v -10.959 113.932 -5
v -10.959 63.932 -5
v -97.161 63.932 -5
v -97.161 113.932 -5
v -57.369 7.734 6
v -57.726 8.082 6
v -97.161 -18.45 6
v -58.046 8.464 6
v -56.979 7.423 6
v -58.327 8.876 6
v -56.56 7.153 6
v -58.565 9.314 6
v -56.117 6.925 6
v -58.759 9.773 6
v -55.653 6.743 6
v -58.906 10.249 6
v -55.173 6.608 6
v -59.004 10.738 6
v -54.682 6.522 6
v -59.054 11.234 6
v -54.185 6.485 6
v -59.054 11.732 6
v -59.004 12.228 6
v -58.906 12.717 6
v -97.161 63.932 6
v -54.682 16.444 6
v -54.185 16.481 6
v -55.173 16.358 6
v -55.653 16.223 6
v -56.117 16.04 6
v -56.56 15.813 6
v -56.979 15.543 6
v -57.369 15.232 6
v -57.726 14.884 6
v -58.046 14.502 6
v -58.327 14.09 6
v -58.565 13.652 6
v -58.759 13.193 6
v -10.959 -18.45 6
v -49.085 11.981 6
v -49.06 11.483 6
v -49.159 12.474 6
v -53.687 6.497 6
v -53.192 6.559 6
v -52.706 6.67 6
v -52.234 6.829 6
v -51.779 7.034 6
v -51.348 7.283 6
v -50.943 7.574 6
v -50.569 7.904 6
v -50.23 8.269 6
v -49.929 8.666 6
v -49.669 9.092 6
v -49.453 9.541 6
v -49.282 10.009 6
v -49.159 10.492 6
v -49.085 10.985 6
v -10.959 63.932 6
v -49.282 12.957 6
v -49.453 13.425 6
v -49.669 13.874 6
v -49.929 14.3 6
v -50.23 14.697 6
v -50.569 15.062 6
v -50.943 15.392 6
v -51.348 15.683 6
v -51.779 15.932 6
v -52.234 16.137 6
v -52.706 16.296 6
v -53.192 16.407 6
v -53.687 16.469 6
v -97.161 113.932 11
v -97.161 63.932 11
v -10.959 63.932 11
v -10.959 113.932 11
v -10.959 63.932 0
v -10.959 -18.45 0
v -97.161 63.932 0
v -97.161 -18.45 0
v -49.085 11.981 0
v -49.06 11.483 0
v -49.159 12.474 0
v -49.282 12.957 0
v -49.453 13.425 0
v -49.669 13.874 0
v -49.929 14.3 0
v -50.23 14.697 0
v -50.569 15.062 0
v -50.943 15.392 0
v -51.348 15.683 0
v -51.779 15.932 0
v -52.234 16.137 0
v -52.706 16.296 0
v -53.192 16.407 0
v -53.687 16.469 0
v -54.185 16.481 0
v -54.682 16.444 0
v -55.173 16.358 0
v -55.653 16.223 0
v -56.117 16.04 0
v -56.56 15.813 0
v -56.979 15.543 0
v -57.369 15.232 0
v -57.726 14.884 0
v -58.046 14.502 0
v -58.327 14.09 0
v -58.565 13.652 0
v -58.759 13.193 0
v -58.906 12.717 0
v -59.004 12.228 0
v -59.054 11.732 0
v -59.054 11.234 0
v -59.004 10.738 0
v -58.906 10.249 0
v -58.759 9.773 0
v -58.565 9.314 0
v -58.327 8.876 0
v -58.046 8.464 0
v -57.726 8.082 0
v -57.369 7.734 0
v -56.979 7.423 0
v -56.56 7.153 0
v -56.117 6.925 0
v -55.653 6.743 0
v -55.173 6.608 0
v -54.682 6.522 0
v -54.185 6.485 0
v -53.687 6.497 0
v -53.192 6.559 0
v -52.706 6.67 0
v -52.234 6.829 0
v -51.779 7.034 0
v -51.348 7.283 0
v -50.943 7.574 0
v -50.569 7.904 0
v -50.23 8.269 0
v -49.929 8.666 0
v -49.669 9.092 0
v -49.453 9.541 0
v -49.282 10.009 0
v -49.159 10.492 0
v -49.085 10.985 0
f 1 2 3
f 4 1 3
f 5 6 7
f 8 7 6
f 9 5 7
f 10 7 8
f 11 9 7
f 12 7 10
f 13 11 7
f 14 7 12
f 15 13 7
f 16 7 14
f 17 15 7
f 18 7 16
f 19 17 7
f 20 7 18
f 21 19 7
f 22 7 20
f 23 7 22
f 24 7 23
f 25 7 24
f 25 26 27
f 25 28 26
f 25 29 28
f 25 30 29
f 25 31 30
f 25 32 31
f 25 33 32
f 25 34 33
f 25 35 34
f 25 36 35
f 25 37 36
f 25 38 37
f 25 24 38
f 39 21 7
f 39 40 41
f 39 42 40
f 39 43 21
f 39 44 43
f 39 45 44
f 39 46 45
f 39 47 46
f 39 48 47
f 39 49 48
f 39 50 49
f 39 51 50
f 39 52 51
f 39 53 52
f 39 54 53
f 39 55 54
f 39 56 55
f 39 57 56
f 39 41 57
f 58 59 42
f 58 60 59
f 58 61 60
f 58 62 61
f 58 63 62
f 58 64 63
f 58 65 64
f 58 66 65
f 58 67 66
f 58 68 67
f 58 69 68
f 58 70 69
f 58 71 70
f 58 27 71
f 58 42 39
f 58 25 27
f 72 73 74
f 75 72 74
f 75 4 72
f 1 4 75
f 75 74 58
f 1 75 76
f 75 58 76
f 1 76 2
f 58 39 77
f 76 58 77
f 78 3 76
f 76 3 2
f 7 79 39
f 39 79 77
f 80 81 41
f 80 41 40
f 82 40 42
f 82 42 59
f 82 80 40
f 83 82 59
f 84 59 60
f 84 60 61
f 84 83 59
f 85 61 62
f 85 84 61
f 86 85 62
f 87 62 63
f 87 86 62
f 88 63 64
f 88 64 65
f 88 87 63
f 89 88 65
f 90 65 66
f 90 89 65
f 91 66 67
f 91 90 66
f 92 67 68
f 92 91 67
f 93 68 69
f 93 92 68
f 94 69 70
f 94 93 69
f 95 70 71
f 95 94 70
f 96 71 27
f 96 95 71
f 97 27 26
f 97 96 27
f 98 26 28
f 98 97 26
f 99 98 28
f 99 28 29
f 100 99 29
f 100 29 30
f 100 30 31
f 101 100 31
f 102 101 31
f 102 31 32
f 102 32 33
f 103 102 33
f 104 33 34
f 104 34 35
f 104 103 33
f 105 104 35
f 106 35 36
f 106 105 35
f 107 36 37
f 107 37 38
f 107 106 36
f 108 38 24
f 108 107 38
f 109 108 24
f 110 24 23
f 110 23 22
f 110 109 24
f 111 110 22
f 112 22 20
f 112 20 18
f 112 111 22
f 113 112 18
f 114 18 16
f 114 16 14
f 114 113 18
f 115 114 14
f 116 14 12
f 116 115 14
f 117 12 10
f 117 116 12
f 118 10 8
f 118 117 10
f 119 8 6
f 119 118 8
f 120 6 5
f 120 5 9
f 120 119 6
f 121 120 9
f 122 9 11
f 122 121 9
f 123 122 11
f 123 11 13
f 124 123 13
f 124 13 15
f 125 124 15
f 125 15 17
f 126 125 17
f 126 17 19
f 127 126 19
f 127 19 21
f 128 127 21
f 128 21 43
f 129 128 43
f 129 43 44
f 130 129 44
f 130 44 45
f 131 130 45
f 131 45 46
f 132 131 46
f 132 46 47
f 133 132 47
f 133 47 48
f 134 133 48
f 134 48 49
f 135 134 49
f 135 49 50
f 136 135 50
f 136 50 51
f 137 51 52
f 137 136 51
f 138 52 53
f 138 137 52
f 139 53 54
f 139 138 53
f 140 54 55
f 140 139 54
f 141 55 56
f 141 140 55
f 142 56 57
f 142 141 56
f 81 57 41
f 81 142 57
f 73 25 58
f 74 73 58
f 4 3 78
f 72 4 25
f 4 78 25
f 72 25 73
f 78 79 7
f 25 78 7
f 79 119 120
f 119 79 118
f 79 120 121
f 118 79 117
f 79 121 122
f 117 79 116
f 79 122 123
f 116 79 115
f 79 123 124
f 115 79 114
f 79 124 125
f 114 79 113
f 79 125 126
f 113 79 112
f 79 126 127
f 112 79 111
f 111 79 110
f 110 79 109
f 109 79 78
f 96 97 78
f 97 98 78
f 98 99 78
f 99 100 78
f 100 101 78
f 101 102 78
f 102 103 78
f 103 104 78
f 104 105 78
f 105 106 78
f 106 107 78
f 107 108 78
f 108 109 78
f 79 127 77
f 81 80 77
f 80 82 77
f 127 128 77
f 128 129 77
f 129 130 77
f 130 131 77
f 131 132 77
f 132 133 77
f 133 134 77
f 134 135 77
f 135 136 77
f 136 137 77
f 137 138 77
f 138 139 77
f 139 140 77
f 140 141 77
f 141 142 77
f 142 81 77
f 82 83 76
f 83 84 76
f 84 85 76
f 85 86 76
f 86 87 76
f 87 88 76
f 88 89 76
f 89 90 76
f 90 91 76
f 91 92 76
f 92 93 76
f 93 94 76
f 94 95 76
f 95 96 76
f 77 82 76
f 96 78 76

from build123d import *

# Parameters (mm, degrees)
SKETCH1_W           = 86.202021521
SKETCH1_H           = 82.381948497
SKETCH1_R           = 5
BOSS_EXTRUDE1_DEPTH = 6
BOSS_EXTRUDE2_DEPTH = 50


with BuildPart() as part:
    # Sketch1 → Boss-Extrude1 (new body)
    with BuildSketch(Plane.XY):
        with Locations((-54.060241917, 22.740820087)):
            Rectangle(SKETCH1_W, SKETCH1_H)
        with Locations((-54.060241916, 11.48296308)):
            Circle(SKETCH1_R, mode=Mode.SUBTRACT)
    extrude(amount=BOSS_EXTRUDE1_DEPTH)

    # Sketch2 → Boss-Extrude2 (add)
    with BuildSketch(Plane(origin=(0, 63.931794335, 0), x_dir=(1, 0, 0), z_dir=(0, 1, 0))):
        Polygon((-97.161252677, -6), (-97.161252677, -11), (-10.959231156, -11), (-10.959231156, 5), (-97.161252677, 5), align=None)
    extrude(amount=BOSS_EXTRUDE2_DEPTH)


solid = part.part
